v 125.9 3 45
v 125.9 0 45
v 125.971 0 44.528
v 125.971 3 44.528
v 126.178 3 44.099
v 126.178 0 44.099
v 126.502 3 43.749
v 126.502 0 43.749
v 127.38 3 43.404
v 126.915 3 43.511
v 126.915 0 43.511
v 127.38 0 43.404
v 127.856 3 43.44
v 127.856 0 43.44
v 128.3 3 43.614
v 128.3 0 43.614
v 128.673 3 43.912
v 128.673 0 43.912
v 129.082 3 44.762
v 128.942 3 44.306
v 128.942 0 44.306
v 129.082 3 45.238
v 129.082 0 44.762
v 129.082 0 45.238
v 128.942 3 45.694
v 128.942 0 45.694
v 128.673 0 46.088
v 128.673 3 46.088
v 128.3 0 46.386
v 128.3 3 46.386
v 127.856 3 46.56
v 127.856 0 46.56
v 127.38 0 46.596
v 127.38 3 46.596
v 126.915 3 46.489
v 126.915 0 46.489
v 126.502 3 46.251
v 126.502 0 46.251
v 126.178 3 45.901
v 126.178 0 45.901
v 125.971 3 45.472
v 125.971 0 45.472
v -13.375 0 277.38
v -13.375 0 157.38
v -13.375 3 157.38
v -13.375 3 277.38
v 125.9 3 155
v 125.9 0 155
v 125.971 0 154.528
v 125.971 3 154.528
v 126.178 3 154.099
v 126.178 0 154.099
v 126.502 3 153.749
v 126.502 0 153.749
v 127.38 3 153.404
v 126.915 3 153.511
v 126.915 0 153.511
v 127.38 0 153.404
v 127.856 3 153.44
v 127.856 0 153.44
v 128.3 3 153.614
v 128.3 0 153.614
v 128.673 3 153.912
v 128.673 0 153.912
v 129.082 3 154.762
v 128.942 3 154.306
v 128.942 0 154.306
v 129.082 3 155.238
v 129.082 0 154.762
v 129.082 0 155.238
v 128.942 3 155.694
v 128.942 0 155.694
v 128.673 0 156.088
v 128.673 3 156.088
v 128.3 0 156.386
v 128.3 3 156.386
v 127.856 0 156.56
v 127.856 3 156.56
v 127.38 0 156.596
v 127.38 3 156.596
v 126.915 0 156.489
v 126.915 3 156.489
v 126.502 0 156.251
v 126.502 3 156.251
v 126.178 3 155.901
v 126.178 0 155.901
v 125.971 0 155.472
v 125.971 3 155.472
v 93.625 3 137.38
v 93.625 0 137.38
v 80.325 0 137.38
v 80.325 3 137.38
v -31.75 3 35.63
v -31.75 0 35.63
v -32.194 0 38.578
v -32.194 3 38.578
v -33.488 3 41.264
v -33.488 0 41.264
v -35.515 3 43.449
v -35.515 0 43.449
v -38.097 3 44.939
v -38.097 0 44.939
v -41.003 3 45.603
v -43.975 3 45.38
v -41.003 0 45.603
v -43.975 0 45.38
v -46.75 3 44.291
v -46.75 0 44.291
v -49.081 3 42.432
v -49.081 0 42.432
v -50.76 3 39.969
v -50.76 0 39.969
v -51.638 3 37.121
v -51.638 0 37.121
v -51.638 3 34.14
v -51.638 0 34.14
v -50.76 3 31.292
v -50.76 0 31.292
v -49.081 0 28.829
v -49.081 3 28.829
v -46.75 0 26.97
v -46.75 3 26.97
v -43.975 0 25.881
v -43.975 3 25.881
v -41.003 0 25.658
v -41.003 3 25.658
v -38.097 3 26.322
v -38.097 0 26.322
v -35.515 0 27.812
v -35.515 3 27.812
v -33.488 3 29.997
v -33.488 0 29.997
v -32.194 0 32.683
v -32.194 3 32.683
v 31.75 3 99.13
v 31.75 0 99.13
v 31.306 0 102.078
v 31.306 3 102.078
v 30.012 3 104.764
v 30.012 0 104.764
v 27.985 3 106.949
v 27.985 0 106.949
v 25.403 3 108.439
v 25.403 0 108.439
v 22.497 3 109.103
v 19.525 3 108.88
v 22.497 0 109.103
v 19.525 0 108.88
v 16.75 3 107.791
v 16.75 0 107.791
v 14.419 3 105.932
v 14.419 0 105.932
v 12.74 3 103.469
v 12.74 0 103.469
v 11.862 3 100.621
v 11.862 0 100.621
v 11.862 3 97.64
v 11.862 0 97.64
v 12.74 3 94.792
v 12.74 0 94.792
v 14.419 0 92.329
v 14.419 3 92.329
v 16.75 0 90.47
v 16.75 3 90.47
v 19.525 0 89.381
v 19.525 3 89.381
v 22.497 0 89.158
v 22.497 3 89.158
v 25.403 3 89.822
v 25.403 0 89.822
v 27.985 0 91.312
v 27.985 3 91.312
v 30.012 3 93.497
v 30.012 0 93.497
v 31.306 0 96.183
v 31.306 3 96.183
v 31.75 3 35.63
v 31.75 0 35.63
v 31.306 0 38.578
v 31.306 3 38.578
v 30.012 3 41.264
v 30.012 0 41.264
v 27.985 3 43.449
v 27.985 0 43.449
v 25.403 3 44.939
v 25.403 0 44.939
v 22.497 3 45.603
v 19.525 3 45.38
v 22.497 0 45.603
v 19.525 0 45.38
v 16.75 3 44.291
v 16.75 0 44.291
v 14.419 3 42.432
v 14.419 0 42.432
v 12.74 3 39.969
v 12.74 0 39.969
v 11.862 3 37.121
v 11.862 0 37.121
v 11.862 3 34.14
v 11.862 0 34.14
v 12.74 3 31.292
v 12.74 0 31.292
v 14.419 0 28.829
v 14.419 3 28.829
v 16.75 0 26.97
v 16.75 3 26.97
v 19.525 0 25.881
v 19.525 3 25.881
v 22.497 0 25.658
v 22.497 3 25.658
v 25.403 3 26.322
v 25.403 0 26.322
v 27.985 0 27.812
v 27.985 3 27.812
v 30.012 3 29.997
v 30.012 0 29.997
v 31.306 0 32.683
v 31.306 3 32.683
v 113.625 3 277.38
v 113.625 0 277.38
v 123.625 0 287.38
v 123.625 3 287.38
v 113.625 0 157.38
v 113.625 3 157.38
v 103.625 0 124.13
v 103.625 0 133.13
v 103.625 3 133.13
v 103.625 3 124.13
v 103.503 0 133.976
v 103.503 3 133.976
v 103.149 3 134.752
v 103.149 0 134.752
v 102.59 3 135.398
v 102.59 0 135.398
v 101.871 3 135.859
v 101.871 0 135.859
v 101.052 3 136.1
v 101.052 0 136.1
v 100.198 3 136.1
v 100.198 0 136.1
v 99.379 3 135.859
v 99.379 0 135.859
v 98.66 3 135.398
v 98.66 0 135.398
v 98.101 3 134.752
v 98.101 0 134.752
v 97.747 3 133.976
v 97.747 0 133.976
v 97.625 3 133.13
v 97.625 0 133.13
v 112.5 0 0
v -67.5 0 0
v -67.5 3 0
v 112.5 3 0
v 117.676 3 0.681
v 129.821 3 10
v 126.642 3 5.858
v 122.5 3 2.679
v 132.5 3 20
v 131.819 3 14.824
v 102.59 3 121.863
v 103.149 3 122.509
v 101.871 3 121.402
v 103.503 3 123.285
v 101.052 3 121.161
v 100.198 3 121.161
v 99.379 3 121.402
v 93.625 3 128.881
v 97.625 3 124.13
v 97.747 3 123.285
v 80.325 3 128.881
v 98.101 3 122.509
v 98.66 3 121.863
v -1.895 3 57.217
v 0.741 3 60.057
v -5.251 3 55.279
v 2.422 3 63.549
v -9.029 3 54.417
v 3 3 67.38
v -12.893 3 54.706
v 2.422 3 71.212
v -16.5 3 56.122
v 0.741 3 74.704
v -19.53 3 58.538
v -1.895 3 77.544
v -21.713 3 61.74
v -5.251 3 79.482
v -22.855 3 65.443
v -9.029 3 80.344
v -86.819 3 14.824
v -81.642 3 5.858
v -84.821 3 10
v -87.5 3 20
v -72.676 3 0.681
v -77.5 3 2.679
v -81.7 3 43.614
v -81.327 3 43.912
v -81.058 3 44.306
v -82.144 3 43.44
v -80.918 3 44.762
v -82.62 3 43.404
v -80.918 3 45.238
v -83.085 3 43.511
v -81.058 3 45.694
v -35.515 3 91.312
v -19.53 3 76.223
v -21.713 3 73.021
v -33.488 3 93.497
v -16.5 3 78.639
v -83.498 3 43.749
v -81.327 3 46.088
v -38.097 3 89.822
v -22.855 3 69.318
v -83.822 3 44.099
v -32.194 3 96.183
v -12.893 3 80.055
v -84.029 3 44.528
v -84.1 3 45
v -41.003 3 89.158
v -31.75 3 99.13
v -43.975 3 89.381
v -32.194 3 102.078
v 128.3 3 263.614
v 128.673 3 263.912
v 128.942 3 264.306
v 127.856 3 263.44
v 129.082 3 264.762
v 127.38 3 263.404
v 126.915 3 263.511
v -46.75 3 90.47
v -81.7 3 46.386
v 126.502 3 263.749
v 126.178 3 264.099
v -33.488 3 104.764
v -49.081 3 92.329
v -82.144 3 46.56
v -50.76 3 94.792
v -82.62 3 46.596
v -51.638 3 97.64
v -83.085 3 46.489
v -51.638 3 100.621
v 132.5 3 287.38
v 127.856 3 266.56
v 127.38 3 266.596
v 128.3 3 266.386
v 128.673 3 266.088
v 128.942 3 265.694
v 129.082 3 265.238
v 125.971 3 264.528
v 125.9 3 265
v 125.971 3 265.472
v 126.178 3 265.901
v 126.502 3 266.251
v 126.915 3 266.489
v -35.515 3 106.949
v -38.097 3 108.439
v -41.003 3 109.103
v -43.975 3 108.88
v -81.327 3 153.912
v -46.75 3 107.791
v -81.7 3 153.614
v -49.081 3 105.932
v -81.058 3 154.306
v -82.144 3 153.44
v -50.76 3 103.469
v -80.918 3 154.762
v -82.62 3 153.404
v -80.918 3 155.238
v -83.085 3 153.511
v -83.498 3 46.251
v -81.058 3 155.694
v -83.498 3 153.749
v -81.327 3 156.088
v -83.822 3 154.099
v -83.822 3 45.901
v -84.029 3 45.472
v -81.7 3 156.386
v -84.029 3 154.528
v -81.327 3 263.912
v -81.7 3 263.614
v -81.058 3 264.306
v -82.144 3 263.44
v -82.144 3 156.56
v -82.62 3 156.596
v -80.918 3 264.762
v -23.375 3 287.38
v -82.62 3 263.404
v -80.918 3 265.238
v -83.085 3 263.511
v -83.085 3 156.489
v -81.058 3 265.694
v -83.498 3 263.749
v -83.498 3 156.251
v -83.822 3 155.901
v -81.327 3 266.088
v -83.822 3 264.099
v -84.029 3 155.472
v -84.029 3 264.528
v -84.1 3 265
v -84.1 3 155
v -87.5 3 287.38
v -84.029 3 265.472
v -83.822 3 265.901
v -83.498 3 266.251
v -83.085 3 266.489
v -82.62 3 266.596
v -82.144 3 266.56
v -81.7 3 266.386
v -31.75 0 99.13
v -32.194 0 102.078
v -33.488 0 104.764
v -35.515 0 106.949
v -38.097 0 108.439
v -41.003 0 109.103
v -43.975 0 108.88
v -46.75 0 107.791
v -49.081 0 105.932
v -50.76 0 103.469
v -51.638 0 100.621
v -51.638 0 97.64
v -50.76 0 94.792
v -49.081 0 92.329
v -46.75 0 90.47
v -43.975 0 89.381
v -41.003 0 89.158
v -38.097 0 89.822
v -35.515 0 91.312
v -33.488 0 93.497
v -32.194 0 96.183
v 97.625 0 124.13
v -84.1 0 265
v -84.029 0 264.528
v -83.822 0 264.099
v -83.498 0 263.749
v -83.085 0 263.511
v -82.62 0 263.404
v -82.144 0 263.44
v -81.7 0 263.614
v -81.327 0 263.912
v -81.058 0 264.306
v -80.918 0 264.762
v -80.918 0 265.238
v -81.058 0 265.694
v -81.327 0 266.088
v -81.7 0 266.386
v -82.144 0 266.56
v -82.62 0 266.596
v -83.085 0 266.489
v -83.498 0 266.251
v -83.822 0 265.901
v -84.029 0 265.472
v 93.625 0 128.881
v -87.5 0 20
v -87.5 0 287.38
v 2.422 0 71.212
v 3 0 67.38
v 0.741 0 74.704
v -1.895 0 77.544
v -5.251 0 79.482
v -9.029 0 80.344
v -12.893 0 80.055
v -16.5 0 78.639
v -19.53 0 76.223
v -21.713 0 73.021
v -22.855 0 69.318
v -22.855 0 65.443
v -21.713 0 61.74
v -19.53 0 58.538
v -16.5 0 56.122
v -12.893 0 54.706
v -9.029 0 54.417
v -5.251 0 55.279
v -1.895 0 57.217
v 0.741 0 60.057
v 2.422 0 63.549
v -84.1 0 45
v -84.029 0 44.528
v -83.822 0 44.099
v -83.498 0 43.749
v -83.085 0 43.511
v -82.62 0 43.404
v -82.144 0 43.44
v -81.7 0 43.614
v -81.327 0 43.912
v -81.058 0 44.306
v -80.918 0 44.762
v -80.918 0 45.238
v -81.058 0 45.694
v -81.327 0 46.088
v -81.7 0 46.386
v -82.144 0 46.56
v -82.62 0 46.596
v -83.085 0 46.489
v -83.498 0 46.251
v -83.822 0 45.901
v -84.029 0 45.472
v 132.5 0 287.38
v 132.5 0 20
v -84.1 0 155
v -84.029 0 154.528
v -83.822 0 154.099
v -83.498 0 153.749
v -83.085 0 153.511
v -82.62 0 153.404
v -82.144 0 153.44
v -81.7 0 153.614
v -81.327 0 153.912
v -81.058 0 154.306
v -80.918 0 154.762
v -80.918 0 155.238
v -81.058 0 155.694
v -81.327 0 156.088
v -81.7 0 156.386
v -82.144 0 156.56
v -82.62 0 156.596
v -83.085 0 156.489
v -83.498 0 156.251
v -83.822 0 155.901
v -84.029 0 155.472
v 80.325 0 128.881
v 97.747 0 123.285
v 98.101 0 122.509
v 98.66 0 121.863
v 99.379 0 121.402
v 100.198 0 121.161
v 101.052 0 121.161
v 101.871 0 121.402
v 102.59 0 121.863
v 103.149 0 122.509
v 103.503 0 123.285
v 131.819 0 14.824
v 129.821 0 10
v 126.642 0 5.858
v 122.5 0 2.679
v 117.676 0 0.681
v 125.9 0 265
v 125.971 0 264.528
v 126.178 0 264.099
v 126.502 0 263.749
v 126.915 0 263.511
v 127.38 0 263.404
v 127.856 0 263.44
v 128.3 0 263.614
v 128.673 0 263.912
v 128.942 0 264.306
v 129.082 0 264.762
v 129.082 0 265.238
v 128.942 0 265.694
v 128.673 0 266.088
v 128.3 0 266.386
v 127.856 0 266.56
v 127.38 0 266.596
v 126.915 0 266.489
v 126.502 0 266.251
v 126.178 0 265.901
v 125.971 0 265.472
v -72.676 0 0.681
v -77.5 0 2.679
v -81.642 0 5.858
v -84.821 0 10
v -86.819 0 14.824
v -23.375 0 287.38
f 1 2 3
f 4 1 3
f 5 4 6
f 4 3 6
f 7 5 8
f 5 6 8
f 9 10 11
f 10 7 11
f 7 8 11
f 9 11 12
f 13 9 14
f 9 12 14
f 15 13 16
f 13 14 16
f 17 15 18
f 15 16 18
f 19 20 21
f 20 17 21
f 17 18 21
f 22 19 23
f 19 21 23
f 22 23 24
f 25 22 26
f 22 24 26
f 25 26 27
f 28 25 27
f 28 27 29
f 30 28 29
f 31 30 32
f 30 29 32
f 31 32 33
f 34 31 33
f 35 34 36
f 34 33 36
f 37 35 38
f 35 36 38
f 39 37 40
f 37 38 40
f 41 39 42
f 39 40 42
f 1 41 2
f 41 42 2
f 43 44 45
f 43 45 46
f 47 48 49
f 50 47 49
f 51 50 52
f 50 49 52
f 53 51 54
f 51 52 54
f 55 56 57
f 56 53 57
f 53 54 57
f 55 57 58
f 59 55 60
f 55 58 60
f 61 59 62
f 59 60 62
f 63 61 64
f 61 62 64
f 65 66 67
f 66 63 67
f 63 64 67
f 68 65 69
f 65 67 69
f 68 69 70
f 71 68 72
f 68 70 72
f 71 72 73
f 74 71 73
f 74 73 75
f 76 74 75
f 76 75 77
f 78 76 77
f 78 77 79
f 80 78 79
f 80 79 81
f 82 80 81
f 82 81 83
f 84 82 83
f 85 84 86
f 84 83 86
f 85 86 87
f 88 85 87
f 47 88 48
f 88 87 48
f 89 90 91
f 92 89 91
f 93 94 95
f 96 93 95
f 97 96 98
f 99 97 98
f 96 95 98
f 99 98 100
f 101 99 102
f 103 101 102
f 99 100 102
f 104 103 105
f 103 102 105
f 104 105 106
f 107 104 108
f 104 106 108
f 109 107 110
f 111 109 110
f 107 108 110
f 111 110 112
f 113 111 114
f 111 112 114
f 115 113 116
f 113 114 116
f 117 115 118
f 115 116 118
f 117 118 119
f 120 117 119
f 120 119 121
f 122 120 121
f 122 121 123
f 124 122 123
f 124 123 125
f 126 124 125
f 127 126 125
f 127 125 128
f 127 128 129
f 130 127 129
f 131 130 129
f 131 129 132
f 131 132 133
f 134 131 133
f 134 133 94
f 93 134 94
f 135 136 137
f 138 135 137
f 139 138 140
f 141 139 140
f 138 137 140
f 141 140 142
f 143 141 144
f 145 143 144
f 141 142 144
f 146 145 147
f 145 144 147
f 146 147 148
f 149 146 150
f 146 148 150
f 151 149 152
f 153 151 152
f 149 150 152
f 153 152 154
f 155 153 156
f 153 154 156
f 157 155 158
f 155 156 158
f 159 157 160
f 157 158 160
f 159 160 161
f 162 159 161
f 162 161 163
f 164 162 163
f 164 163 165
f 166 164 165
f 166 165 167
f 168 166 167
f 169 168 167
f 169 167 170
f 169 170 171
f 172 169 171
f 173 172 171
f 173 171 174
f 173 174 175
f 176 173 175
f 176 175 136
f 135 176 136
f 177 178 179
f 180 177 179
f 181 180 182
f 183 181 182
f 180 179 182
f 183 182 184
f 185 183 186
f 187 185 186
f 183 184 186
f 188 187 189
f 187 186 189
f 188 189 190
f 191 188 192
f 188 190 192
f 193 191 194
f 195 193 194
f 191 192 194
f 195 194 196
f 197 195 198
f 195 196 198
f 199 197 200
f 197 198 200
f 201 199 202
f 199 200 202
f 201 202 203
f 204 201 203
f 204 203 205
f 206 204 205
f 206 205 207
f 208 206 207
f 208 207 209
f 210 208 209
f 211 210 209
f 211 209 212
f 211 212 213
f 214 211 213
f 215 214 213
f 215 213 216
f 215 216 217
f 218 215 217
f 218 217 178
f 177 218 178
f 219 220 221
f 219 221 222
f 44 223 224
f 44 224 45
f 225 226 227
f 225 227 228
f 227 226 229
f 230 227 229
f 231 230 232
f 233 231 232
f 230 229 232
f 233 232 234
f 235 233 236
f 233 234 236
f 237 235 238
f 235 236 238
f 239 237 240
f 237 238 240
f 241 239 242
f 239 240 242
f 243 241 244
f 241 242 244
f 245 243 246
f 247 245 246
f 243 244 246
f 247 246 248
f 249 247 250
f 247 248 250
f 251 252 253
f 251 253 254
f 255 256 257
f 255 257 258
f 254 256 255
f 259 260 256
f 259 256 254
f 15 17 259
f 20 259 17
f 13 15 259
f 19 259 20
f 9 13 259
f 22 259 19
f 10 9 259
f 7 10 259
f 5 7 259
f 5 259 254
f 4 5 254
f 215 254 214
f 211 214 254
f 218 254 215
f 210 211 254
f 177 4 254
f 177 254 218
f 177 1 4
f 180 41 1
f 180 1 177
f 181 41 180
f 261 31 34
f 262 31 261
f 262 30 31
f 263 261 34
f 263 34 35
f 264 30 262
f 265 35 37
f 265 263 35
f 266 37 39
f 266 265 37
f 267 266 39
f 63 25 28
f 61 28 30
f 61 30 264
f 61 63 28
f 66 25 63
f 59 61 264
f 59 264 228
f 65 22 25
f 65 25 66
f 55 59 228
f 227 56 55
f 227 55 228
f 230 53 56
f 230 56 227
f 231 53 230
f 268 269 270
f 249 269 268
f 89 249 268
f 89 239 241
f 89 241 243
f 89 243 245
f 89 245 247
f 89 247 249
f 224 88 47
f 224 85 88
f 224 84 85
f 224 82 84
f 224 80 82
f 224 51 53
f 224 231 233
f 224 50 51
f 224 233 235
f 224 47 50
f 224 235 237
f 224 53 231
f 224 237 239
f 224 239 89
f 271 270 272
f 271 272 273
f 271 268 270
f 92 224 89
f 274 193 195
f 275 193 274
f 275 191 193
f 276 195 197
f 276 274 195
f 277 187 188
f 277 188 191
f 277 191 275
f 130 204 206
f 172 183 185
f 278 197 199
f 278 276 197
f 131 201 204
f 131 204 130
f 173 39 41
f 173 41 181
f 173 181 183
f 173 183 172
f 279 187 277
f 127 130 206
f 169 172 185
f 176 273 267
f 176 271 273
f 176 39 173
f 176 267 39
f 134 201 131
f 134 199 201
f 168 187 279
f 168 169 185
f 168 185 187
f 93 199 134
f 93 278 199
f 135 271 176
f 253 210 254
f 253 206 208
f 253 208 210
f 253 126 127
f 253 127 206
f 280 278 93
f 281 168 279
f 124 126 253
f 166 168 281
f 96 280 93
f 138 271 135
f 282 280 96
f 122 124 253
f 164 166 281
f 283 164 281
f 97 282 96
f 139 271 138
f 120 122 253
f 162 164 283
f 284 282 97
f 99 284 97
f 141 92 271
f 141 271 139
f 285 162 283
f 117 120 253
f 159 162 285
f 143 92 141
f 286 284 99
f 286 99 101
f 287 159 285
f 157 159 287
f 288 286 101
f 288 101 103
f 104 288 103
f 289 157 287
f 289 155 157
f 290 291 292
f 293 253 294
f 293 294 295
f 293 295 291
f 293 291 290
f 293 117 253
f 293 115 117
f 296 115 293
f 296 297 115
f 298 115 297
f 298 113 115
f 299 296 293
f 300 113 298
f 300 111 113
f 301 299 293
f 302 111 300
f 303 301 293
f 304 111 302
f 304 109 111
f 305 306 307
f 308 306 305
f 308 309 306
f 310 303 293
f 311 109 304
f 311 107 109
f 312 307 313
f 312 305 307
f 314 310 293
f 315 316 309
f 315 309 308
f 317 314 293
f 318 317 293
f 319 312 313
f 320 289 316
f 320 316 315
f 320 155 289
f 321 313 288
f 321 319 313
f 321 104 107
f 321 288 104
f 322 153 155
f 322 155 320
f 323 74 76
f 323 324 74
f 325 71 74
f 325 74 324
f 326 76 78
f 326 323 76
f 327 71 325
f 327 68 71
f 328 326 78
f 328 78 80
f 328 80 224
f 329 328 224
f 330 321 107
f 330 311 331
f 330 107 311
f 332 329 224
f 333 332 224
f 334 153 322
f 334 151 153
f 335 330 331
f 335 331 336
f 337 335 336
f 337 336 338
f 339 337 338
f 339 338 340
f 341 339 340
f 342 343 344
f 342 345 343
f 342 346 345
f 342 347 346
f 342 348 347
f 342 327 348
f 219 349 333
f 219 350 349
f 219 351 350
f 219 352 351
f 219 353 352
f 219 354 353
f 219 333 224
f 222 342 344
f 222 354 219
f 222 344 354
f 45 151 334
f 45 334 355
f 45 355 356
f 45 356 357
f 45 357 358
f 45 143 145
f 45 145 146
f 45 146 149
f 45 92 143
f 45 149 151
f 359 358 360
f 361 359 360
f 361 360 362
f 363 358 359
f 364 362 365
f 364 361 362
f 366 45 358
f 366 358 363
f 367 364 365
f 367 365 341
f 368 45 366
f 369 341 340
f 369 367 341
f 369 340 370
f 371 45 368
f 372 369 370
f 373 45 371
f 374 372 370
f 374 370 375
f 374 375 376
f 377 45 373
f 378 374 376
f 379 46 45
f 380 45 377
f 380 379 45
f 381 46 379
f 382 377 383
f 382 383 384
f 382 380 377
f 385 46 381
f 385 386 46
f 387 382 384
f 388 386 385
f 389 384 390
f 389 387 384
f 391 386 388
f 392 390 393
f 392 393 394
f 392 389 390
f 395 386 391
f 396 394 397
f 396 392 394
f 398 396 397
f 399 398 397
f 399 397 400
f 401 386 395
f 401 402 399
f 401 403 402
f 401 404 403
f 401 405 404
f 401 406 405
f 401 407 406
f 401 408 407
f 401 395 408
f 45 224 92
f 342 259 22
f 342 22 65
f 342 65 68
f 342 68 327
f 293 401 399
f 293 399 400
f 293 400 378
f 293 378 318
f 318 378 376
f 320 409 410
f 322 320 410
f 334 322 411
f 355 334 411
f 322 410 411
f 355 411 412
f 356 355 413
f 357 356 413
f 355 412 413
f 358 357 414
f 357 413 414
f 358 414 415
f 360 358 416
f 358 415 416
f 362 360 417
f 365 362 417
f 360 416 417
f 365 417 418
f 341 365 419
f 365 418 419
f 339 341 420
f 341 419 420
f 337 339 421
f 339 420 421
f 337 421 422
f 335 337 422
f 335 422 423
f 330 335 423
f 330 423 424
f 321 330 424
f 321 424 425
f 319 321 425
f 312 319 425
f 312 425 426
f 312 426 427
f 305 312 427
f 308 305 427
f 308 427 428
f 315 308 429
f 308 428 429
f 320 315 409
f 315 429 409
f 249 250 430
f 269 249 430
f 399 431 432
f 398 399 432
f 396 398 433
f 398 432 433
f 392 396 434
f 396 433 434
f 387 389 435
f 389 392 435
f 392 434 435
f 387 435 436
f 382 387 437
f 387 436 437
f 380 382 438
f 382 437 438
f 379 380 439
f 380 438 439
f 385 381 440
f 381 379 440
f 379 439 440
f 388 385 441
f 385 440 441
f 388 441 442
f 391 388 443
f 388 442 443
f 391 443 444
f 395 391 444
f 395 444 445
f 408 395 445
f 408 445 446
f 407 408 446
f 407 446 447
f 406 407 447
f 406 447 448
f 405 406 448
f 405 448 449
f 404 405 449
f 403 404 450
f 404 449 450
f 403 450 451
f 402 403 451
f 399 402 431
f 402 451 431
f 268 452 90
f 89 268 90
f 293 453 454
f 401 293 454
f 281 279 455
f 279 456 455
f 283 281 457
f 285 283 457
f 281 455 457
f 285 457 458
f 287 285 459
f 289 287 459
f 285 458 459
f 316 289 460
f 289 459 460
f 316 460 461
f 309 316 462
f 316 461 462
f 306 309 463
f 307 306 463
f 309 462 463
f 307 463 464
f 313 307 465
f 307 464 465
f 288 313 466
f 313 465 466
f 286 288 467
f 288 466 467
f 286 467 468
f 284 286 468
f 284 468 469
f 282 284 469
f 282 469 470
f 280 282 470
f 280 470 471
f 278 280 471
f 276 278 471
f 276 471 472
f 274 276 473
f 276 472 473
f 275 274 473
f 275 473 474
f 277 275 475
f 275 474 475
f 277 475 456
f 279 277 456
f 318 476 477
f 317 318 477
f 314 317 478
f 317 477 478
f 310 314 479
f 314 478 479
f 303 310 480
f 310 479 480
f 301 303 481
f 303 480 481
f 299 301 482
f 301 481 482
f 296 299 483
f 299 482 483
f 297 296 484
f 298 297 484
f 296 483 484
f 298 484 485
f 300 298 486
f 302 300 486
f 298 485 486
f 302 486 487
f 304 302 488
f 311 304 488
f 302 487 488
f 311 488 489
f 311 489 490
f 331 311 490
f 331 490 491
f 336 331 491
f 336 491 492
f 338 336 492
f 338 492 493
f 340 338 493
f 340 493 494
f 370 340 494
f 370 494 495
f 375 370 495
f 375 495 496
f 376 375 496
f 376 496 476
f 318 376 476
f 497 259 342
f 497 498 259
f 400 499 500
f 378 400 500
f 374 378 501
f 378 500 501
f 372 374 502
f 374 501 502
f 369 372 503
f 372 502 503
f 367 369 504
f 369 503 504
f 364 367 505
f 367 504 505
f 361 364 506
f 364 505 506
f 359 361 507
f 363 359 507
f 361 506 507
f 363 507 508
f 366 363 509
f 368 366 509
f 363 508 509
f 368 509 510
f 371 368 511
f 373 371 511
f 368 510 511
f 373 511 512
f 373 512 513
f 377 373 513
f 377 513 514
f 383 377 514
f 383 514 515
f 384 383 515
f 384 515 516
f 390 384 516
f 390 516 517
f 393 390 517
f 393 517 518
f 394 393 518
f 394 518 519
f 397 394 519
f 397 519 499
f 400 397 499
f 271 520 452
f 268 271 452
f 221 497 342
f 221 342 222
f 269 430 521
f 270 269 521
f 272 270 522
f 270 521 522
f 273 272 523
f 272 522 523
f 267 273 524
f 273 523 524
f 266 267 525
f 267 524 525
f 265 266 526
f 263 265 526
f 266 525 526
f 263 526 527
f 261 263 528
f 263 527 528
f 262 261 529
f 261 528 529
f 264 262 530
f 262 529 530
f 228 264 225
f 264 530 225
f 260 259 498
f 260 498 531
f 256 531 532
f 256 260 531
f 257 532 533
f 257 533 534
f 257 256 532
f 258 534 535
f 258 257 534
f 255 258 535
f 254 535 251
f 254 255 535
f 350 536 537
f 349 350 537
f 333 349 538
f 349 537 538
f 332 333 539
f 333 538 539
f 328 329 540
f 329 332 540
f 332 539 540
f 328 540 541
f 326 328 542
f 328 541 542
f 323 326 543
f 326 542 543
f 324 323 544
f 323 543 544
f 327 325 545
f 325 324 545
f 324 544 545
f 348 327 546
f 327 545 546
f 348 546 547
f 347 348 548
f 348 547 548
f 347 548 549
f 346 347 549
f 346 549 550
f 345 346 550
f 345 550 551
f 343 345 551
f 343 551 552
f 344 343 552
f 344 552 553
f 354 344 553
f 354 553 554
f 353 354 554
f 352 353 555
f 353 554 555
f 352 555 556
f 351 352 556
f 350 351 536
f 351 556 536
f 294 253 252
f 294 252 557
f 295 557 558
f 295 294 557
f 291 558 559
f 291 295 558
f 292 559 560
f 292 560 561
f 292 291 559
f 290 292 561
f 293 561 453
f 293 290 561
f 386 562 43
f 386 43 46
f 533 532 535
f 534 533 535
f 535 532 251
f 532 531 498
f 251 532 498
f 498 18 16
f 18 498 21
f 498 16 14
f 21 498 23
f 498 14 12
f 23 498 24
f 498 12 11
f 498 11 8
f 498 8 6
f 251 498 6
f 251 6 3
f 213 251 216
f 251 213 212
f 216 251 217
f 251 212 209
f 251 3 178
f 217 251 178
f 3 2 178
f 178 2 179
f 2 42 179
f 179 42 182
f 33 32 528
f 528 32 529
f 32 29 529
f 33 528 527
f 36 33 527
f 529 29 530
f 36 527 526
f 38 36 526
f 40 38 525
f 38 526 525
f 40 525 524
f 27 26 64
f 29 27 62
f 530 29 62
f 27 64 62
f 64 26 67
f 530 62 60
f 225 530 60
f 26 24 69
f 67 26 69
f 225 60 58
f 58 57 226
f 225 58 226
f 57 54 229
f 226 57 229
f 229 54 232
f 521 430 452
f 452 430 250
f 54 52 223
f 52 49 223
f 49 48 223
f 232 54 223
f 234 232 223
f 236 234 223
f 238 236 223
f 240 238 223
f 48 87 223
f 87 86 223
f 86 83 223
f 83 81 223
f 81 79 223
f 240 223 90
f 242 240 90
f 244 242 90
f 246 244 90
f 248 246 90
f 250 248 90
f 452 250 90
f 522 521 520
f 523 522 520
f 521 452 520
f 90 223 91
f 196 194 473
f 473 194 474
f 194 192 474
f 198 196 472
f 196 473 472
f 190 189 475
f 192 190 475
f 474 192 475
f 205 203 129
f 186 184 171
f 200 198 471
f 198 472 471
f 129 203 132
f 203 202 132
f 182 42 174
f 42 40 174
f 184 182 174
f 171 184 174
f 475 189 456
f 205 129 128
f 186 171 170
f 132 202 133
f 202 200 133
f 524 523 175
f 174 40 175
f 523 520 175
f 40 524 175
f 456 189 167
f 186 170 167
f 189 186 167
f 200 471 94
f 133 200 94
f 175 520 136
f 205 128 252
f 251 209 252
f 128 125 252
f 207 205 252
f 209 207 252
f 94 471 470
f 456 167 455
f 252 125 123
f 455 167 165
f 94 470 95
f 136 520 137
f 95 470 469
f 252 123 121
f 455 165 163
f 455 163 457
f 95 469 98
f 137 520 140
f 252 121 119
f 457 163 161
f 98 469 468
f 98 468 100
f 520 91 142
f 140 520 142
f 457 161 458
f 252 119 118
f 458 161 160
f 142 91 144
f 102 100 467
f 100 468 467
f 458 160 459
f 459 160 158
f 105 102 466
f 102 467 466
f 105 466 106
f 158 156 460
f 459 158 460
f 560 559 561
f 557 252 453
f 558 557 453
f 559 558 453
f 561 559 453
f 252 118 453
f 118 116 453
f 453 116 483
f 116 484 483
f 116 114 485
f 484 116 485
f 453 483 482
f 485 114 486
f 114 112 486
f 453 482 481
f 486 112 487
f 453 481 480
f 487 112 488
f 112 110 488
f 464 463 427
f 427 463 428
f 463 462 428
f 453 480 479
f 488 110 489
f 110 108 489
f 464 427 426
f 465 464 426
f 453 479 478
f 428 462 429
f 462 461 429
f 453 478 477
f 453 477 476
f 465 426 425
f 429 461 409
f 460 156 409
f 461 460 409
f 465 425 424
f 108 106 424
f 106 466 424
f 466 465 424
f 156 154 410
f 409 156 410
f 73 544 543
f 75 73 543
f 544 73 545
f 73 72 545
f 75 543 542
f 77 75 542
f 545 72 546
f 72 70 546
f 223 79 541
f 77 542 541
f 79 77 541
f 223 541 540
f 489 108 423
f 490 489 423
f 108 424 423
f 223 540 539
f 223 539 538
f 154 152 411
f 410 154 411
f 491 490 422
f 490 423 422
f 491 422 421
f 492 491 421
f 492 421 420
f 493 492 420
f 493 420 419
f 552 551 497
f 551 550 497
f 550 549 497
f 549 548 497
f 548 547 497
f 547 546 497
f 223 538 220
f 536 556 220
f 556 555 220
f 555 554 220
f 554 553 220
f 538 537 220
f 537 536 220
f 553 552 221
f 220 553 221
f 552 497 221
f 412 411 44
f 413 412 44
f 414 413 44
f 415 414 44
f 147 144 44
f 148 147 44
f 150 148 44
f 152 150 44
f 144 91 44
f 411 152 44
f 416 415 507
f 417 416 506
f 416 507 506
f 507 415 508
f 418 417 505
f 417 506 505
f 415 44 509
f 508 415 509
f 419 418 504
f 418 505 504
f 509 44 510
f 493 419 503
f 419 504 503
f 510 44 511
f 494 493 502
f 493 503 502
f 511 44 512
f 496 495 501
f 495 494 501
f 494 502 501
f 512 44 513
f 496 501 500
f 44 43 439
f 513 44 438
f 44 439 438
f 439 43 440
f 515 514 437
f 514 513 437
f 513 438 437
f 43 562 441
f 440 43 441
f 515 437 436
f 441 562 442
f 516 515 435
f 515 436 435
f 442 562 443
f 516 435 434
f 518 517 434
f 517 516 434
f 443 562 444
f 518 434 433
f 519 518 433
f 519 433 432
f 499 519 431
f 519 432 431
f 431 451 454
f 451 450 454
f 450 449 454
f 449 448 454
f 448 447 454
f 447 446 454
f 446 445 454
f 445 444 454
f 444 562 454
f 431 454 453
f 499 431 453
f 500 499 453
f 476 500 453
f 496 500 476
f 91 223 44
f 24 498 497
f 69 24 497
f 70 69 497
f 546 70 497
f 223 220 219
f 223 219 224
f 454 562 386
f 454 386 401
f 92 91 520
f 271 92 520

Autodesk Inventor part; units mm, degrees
ref_plane "YZ Plane" through (0, 0, 0) normal (1, 0, 0) x (0, 1, 0)
ref_plane "XZ Plane" through (0, 0, 0) normal (0, 1, 0) x (-1, 0, 0)
ref_plane "XY Plane" through (0, 0, 0) normal (0, 0, 1) x (1, 0, 0)
sketch "Sketch1" plane through (0, 0, 0) normal (0, 1, 0) x (-1, 0, 0)
  line L0 (-132.5, 287.3805) -> (-122.5, 287.3805)
  line L1 (-132.5, 20) -> (-132.5, 287.3805)
  line L2 (-122.5, 20) -> (-122.5, 287.3805)
  line L3 (77.5, 287.3805) -> (87.5, 287.3805)
  line L4 (77.5, 20) -> (77.5, 287.3805)
  line L5 (87.5, 20) -> (87.5, 287.3805)
  line L6 (82.5, 0) -> (127.5, 0) construction
  line L7 (-132.5, 20) -> (-132.5, 287.3805)
  line L8 (82.5, 45) -> (-127.5, 45)
  line L9 (82.5, 155) -> (-127.5, 155)
  circle A0 centre (-127.5, 265) radius 1.6
  circle A1 centre (-127.5, 155) radius 1.6
  circle A2 centre (-127.5, 45) radius 1.6
  circle A3 centre (82.5, 45) radius 1.6
  circle A4 centre (82.5, 155) radius 1.6
  circle A5 centre (82.5, 265) radius 1.6
  line L10 (-132.5, 287.3805) -> (87.5, 287.3805)
  line L11 (87.5, 287.3805) -> (87.5, 0)
  line L12 (87.5, 0) -> (-132.5, 0)
  line L13 (-132.5, 0) -> (-132.5, 287.3805)
  line L14 (87.5, 0) -> (-132.5, 0)
  line L15 (-132.5, 0) -> (-132.5, -22.8)
  line L16 (-132.5, -22.8) -> (87.5, -22.8)
  line L17 (87.5, -22.8) -> (87.5, 0)
  arc A6 (6, 100) -> (0, 94) centre (6, 94) ccw
  line L18 (0, 0) -> (0, 94)
  line L19 (0, 0) -> (90, 0)
  line L20 (90, 0) -> (90, 94)
  arc A7 (90, 94) -> (84, 100) centre (84, 94) ccw
  line L21 (6, 100) -> (84, 100)
  circle A8 centre (45, 47.3805) radius 11
  circle A9 centre (76.75, 79.1305) radius 5.75
  circle A10 centre (13.25, 15.6305) radius 5.75
  circle A11 centre (76.75, 15.6305) radius 5.75
  circle A12 centre (13.25, 79.1305) radius 5.75
  circle A13 centre (117.5, 135) radius 1.8
  line L22 (112.5, 267.3805) -> (122.5, 267.3805)
  line L23 (112.5, 0) -> (112.5, 267.3805)
  line L24 (112.5, 0) -> (122.5, 0)
  line L25 (122.5, 0) -> (122.5, 267.3805)
  circle A14 centre (117.5, 25) radius 1.8
  circle A15 centre (117.5, 245) radius 1.8
  circle A16 centre (-92.5, 135) radius 1.8
  line L26 (-97.5, 267.3805) -> (-87.5, 267.3805)
  line L27 (-97.5, 0) -> (-97.5, 267.3805)
  line L28 (-97.5, 0) -> (-87.5, 0)
  line L29 (-87.5, 0) -> (-87.5, 267.3805)
  circle A17 centre (-92.5, 245) radius 1.8
  circle A18 centre (-92.5, 25) radius 1.8
  point P0 (-62.5, 0)
  point P1 (52.5, -20)
  dimension "d0" = 45
  dimension "d2" = 110
  dimension "d4" = 3.2
  dimension "d5" = 3.2
  dimension "d6" = 3.2
  dimension "d7" = 3.2
  dimension "d8" = 3.2
  dimension "d9" = 3.2
  dimension "d12" = 22.8
extrude "Extrusion1" add sketch "Sketch1" along normal blind 3 contours L0 L2 L8 L27 L12 L13 L1 | L10 L4 L9 L29 L26 L27 L2 | L9 L27 L8 L2 | L3 L5 A7 L21 L4 | L27 L26 L29 L9 | L9 L29 L8 L27 | L4 L21 A6 L18 L8 L29 L9 | L27 L8 L29 L12 | L5 L11 L12 L18 L8 A8 L4 A9 L21 A7 | L4 A9 L8 A8 L18 A6 L21 | L29 L8 L18 L12 | A9 L4 | L4 A9 | A8 L8 | L8 A8 | A10 | A11 | A12 | A16 | A17 | A18
fillet "Fillet1" radius 20 2 edges at (132.5, 1.5, 0) (-87.5, 1.5, 0)
sketch "Sketch4" plane through (0, 0, 0) normal (0, -1, 0) x (1, 0, 0)
  line L0 (68.5, 205.2102) -> (31.5, 205.2102)
  line L1 (78.5, 192.2868) -> (21.5, 192.2868)
  line L2 (21.5, 205.2102) -> (31.5, 205.2102)
  line L3 (68.5, 205.2102) -> (78.5, 205.2102)
  line L4 (78.5, 205.2102) -> (78.5, 192.2868)
  line L5 (21.5, 192.2868) -> (21.5, 205.2102)
  circle A0 centre (21.75, 99.1305) radius 7.65
  circle A1 centre (-41.75, 99.1305) radius 7.65
  circle A2 centre (21.75, 35.6305) radius 7.65
  arc A3 (10, 67.3805) -> (-30, 67.3805) centre (-10, 67.3805) ccw
  line L6 (10, 67.3805) -> (10, -32.6195)
  line L7 (-30, -32.6195) -> (-30, 67.3805)
  circle A4 centre (-41.75, 35.6305) radius 7.65
  line L8 (-87.5, 20) -> (-87.5, 287.3805)
  line L9 (-87.5, 287.3805) -> (132.5, 287.3805)
  line L10 (132.5, 287.3805) -> (132.5, 20)
  line L11 (112.5, 0) -> (-67.5, 0)
  line L12 (-87.5, 20) -> (-87.5, 287.3805) projected
  line L13 (-87.5, 287.3805) -> (132.5, 287.3805) projected
  circle A5 centre (-41.75, 99.1305) radius 10
  circle A6 centre (21.75, 99.1305) radius 10
  circle A7 centre (-41.75, 35.6305) radius 10
  circle A8 centre (21.75, 35.6305) radius 10
  line L14 (-87.5, 287.3805) -> (132.5, 287.3805) projected
  line L15 (21.75, 287.3805) -> (78.5, 287.3805)
  line L16 (78.5, 287.3805) -> (78.5, 157.3805)
  line L17 (78.5, 157.3805) -> (21.75, 157.3805)
  line L18 (21.75, 157.3805) -> (21.75, 287.3805)
  circle A9 centre (-10, 67.3805) radius 13
  line L19 (80.125, 157.3805) -> (20.125, 157.3805)
  line L20 (20.125, 157.3805) -> (20.125, 287.3805)
  line L21 (20.125, 287.3805) -> (80.125, 287.3805)
  line L22 (80.125, 287.3805) -> (80.125, 157.3805)
  line L23 (80.125, 157.3805) -> (20.125, 287.3805) construction
  line L24 (20.125, 157.3805) -> (80.125, 287.3805) construction
  line L25 (-13.375, 287.3805) -> (113.625, 287.3805)
  line L26 (113.625, 287.3805) -> (113.625, 157.3805)
  line L27 (113.625, 157.3805) -> (-13.375, 157.3805)
  line L28 (-13.375, 157.3805) -> (-13.375, 287.3805)
  line L29 (-13.375, 287.3805) -> (113.625, 157.3805) construction
  line L30 (113.625, 287.3805) -> (-13.375, 157.3805) construction
  point P0 (0, 0)
  point P1 (50.125, 222.3805)
  dimension "d24" = 20
  dimension "d25" = 20
  dimension "d26" = 20
  dimension "d27" = 20
  dimension "d28" = 130
  dimension "d29" = 26
  dimension "d36" = 60
  dimension "d37" = 130
  dimension "d38" = 127
extrude "Extrusion3" cut sketch "Sketch4" against normal up to surface (3 mm away) contours L3 L4 L1 L18 L2 L0 | L0 L2 L18 L9 L16 L3 | L16 L9 L22 L19 L4 | L18 L1 L5 L2 | L2 L5 L1 L18 L19 L20 L9 | L16 L17 L18 L1 | L9 L26 L27 L22 | L20 L27 L28 L9 | A0 | A1 | A2 | A4 | A5 | A6 | A7 | A8 | A9
chamfer "Chamfer1" distance 10 angle 45 2 edges at (-13.375, 1.5, 287.3805) (113.625, 1.5, 287.3805)
sketch "Sketch5" plane through (0, 0, 0) normal (0, -1, 0) x (1, 0, 0)
  line L0 (113.625, 157.3805) -> (-13.375, 157.3805) projected
  line L1 (113.625, 157.3805) -> (93.625, 157.3805)
  line L2 (93.625, 157.3805) -> (93.625, 137.3805)
  line L3 (93.625, 137.3805) -> (80.325, 137.3805)
  line L4 (80.325, 137.3805) -> (80.325, 128.8805)
  line L5 (80.325, 128.8805) -> (93.625, 128.8805)
  line L6 (93.625, 128.8805) -> (93.625, 137.3805)
  line L7 (93.625, 133.1305) -> (100.625, 133.1305)
  circle A0 centre (100.625, 133.1305) radius 3
  line L8 (97.625, 133.1305) -> (97.625, 127.1305)
  line L9 (103.625, 133.1305) -> (103.625, 127.1305)
  line L10 (100.625, 133.1305) -> (100.625, 124.1305)
  circle A1 centre (100.625, 124.1305) radius 3
  line L11 (97.625, 127.1305) -> (97.625, 124.1305)
  line L12 (103.625, 127.1305) -> (103.625, 124.1305)
  point P0 (0, 0)
  dimension "d39" = 20
  dimension "d40" = 20
  dimension "d41" = 13.3
  dimension "d42" = 8.5
  dimension "d45" = 7
  dimension "d46" = 6
  dimension "d47" = 6
  dimension "d48" = 6
  dimension "d49" = 9
extrude "Extrusion4" cut sketch "Sketch5" against normal up to surface (3 mm away)
equation "\"BendRadius\" = Thickness"
equation "\"BendReliefWidth\" = Thickness"
equation "\"BendReliefDepth\" = 0.5 * Thickness"
equation "\"CornerReliefSize\" = 4 * Thickness"
equation "\"MinimumRemnant\" = 2 * Thickness"
equation "\"TransitionRadius\" = BendRadius"
equation "\"JacobiRadiusSize\" = Thickness"
equation "\"GapSize\" = Thickness"
equation "\"Thickness\" = 0.5"
properties part number "obudowa_zewnetrzna_tyl_korba" material "ABS Plastic"
